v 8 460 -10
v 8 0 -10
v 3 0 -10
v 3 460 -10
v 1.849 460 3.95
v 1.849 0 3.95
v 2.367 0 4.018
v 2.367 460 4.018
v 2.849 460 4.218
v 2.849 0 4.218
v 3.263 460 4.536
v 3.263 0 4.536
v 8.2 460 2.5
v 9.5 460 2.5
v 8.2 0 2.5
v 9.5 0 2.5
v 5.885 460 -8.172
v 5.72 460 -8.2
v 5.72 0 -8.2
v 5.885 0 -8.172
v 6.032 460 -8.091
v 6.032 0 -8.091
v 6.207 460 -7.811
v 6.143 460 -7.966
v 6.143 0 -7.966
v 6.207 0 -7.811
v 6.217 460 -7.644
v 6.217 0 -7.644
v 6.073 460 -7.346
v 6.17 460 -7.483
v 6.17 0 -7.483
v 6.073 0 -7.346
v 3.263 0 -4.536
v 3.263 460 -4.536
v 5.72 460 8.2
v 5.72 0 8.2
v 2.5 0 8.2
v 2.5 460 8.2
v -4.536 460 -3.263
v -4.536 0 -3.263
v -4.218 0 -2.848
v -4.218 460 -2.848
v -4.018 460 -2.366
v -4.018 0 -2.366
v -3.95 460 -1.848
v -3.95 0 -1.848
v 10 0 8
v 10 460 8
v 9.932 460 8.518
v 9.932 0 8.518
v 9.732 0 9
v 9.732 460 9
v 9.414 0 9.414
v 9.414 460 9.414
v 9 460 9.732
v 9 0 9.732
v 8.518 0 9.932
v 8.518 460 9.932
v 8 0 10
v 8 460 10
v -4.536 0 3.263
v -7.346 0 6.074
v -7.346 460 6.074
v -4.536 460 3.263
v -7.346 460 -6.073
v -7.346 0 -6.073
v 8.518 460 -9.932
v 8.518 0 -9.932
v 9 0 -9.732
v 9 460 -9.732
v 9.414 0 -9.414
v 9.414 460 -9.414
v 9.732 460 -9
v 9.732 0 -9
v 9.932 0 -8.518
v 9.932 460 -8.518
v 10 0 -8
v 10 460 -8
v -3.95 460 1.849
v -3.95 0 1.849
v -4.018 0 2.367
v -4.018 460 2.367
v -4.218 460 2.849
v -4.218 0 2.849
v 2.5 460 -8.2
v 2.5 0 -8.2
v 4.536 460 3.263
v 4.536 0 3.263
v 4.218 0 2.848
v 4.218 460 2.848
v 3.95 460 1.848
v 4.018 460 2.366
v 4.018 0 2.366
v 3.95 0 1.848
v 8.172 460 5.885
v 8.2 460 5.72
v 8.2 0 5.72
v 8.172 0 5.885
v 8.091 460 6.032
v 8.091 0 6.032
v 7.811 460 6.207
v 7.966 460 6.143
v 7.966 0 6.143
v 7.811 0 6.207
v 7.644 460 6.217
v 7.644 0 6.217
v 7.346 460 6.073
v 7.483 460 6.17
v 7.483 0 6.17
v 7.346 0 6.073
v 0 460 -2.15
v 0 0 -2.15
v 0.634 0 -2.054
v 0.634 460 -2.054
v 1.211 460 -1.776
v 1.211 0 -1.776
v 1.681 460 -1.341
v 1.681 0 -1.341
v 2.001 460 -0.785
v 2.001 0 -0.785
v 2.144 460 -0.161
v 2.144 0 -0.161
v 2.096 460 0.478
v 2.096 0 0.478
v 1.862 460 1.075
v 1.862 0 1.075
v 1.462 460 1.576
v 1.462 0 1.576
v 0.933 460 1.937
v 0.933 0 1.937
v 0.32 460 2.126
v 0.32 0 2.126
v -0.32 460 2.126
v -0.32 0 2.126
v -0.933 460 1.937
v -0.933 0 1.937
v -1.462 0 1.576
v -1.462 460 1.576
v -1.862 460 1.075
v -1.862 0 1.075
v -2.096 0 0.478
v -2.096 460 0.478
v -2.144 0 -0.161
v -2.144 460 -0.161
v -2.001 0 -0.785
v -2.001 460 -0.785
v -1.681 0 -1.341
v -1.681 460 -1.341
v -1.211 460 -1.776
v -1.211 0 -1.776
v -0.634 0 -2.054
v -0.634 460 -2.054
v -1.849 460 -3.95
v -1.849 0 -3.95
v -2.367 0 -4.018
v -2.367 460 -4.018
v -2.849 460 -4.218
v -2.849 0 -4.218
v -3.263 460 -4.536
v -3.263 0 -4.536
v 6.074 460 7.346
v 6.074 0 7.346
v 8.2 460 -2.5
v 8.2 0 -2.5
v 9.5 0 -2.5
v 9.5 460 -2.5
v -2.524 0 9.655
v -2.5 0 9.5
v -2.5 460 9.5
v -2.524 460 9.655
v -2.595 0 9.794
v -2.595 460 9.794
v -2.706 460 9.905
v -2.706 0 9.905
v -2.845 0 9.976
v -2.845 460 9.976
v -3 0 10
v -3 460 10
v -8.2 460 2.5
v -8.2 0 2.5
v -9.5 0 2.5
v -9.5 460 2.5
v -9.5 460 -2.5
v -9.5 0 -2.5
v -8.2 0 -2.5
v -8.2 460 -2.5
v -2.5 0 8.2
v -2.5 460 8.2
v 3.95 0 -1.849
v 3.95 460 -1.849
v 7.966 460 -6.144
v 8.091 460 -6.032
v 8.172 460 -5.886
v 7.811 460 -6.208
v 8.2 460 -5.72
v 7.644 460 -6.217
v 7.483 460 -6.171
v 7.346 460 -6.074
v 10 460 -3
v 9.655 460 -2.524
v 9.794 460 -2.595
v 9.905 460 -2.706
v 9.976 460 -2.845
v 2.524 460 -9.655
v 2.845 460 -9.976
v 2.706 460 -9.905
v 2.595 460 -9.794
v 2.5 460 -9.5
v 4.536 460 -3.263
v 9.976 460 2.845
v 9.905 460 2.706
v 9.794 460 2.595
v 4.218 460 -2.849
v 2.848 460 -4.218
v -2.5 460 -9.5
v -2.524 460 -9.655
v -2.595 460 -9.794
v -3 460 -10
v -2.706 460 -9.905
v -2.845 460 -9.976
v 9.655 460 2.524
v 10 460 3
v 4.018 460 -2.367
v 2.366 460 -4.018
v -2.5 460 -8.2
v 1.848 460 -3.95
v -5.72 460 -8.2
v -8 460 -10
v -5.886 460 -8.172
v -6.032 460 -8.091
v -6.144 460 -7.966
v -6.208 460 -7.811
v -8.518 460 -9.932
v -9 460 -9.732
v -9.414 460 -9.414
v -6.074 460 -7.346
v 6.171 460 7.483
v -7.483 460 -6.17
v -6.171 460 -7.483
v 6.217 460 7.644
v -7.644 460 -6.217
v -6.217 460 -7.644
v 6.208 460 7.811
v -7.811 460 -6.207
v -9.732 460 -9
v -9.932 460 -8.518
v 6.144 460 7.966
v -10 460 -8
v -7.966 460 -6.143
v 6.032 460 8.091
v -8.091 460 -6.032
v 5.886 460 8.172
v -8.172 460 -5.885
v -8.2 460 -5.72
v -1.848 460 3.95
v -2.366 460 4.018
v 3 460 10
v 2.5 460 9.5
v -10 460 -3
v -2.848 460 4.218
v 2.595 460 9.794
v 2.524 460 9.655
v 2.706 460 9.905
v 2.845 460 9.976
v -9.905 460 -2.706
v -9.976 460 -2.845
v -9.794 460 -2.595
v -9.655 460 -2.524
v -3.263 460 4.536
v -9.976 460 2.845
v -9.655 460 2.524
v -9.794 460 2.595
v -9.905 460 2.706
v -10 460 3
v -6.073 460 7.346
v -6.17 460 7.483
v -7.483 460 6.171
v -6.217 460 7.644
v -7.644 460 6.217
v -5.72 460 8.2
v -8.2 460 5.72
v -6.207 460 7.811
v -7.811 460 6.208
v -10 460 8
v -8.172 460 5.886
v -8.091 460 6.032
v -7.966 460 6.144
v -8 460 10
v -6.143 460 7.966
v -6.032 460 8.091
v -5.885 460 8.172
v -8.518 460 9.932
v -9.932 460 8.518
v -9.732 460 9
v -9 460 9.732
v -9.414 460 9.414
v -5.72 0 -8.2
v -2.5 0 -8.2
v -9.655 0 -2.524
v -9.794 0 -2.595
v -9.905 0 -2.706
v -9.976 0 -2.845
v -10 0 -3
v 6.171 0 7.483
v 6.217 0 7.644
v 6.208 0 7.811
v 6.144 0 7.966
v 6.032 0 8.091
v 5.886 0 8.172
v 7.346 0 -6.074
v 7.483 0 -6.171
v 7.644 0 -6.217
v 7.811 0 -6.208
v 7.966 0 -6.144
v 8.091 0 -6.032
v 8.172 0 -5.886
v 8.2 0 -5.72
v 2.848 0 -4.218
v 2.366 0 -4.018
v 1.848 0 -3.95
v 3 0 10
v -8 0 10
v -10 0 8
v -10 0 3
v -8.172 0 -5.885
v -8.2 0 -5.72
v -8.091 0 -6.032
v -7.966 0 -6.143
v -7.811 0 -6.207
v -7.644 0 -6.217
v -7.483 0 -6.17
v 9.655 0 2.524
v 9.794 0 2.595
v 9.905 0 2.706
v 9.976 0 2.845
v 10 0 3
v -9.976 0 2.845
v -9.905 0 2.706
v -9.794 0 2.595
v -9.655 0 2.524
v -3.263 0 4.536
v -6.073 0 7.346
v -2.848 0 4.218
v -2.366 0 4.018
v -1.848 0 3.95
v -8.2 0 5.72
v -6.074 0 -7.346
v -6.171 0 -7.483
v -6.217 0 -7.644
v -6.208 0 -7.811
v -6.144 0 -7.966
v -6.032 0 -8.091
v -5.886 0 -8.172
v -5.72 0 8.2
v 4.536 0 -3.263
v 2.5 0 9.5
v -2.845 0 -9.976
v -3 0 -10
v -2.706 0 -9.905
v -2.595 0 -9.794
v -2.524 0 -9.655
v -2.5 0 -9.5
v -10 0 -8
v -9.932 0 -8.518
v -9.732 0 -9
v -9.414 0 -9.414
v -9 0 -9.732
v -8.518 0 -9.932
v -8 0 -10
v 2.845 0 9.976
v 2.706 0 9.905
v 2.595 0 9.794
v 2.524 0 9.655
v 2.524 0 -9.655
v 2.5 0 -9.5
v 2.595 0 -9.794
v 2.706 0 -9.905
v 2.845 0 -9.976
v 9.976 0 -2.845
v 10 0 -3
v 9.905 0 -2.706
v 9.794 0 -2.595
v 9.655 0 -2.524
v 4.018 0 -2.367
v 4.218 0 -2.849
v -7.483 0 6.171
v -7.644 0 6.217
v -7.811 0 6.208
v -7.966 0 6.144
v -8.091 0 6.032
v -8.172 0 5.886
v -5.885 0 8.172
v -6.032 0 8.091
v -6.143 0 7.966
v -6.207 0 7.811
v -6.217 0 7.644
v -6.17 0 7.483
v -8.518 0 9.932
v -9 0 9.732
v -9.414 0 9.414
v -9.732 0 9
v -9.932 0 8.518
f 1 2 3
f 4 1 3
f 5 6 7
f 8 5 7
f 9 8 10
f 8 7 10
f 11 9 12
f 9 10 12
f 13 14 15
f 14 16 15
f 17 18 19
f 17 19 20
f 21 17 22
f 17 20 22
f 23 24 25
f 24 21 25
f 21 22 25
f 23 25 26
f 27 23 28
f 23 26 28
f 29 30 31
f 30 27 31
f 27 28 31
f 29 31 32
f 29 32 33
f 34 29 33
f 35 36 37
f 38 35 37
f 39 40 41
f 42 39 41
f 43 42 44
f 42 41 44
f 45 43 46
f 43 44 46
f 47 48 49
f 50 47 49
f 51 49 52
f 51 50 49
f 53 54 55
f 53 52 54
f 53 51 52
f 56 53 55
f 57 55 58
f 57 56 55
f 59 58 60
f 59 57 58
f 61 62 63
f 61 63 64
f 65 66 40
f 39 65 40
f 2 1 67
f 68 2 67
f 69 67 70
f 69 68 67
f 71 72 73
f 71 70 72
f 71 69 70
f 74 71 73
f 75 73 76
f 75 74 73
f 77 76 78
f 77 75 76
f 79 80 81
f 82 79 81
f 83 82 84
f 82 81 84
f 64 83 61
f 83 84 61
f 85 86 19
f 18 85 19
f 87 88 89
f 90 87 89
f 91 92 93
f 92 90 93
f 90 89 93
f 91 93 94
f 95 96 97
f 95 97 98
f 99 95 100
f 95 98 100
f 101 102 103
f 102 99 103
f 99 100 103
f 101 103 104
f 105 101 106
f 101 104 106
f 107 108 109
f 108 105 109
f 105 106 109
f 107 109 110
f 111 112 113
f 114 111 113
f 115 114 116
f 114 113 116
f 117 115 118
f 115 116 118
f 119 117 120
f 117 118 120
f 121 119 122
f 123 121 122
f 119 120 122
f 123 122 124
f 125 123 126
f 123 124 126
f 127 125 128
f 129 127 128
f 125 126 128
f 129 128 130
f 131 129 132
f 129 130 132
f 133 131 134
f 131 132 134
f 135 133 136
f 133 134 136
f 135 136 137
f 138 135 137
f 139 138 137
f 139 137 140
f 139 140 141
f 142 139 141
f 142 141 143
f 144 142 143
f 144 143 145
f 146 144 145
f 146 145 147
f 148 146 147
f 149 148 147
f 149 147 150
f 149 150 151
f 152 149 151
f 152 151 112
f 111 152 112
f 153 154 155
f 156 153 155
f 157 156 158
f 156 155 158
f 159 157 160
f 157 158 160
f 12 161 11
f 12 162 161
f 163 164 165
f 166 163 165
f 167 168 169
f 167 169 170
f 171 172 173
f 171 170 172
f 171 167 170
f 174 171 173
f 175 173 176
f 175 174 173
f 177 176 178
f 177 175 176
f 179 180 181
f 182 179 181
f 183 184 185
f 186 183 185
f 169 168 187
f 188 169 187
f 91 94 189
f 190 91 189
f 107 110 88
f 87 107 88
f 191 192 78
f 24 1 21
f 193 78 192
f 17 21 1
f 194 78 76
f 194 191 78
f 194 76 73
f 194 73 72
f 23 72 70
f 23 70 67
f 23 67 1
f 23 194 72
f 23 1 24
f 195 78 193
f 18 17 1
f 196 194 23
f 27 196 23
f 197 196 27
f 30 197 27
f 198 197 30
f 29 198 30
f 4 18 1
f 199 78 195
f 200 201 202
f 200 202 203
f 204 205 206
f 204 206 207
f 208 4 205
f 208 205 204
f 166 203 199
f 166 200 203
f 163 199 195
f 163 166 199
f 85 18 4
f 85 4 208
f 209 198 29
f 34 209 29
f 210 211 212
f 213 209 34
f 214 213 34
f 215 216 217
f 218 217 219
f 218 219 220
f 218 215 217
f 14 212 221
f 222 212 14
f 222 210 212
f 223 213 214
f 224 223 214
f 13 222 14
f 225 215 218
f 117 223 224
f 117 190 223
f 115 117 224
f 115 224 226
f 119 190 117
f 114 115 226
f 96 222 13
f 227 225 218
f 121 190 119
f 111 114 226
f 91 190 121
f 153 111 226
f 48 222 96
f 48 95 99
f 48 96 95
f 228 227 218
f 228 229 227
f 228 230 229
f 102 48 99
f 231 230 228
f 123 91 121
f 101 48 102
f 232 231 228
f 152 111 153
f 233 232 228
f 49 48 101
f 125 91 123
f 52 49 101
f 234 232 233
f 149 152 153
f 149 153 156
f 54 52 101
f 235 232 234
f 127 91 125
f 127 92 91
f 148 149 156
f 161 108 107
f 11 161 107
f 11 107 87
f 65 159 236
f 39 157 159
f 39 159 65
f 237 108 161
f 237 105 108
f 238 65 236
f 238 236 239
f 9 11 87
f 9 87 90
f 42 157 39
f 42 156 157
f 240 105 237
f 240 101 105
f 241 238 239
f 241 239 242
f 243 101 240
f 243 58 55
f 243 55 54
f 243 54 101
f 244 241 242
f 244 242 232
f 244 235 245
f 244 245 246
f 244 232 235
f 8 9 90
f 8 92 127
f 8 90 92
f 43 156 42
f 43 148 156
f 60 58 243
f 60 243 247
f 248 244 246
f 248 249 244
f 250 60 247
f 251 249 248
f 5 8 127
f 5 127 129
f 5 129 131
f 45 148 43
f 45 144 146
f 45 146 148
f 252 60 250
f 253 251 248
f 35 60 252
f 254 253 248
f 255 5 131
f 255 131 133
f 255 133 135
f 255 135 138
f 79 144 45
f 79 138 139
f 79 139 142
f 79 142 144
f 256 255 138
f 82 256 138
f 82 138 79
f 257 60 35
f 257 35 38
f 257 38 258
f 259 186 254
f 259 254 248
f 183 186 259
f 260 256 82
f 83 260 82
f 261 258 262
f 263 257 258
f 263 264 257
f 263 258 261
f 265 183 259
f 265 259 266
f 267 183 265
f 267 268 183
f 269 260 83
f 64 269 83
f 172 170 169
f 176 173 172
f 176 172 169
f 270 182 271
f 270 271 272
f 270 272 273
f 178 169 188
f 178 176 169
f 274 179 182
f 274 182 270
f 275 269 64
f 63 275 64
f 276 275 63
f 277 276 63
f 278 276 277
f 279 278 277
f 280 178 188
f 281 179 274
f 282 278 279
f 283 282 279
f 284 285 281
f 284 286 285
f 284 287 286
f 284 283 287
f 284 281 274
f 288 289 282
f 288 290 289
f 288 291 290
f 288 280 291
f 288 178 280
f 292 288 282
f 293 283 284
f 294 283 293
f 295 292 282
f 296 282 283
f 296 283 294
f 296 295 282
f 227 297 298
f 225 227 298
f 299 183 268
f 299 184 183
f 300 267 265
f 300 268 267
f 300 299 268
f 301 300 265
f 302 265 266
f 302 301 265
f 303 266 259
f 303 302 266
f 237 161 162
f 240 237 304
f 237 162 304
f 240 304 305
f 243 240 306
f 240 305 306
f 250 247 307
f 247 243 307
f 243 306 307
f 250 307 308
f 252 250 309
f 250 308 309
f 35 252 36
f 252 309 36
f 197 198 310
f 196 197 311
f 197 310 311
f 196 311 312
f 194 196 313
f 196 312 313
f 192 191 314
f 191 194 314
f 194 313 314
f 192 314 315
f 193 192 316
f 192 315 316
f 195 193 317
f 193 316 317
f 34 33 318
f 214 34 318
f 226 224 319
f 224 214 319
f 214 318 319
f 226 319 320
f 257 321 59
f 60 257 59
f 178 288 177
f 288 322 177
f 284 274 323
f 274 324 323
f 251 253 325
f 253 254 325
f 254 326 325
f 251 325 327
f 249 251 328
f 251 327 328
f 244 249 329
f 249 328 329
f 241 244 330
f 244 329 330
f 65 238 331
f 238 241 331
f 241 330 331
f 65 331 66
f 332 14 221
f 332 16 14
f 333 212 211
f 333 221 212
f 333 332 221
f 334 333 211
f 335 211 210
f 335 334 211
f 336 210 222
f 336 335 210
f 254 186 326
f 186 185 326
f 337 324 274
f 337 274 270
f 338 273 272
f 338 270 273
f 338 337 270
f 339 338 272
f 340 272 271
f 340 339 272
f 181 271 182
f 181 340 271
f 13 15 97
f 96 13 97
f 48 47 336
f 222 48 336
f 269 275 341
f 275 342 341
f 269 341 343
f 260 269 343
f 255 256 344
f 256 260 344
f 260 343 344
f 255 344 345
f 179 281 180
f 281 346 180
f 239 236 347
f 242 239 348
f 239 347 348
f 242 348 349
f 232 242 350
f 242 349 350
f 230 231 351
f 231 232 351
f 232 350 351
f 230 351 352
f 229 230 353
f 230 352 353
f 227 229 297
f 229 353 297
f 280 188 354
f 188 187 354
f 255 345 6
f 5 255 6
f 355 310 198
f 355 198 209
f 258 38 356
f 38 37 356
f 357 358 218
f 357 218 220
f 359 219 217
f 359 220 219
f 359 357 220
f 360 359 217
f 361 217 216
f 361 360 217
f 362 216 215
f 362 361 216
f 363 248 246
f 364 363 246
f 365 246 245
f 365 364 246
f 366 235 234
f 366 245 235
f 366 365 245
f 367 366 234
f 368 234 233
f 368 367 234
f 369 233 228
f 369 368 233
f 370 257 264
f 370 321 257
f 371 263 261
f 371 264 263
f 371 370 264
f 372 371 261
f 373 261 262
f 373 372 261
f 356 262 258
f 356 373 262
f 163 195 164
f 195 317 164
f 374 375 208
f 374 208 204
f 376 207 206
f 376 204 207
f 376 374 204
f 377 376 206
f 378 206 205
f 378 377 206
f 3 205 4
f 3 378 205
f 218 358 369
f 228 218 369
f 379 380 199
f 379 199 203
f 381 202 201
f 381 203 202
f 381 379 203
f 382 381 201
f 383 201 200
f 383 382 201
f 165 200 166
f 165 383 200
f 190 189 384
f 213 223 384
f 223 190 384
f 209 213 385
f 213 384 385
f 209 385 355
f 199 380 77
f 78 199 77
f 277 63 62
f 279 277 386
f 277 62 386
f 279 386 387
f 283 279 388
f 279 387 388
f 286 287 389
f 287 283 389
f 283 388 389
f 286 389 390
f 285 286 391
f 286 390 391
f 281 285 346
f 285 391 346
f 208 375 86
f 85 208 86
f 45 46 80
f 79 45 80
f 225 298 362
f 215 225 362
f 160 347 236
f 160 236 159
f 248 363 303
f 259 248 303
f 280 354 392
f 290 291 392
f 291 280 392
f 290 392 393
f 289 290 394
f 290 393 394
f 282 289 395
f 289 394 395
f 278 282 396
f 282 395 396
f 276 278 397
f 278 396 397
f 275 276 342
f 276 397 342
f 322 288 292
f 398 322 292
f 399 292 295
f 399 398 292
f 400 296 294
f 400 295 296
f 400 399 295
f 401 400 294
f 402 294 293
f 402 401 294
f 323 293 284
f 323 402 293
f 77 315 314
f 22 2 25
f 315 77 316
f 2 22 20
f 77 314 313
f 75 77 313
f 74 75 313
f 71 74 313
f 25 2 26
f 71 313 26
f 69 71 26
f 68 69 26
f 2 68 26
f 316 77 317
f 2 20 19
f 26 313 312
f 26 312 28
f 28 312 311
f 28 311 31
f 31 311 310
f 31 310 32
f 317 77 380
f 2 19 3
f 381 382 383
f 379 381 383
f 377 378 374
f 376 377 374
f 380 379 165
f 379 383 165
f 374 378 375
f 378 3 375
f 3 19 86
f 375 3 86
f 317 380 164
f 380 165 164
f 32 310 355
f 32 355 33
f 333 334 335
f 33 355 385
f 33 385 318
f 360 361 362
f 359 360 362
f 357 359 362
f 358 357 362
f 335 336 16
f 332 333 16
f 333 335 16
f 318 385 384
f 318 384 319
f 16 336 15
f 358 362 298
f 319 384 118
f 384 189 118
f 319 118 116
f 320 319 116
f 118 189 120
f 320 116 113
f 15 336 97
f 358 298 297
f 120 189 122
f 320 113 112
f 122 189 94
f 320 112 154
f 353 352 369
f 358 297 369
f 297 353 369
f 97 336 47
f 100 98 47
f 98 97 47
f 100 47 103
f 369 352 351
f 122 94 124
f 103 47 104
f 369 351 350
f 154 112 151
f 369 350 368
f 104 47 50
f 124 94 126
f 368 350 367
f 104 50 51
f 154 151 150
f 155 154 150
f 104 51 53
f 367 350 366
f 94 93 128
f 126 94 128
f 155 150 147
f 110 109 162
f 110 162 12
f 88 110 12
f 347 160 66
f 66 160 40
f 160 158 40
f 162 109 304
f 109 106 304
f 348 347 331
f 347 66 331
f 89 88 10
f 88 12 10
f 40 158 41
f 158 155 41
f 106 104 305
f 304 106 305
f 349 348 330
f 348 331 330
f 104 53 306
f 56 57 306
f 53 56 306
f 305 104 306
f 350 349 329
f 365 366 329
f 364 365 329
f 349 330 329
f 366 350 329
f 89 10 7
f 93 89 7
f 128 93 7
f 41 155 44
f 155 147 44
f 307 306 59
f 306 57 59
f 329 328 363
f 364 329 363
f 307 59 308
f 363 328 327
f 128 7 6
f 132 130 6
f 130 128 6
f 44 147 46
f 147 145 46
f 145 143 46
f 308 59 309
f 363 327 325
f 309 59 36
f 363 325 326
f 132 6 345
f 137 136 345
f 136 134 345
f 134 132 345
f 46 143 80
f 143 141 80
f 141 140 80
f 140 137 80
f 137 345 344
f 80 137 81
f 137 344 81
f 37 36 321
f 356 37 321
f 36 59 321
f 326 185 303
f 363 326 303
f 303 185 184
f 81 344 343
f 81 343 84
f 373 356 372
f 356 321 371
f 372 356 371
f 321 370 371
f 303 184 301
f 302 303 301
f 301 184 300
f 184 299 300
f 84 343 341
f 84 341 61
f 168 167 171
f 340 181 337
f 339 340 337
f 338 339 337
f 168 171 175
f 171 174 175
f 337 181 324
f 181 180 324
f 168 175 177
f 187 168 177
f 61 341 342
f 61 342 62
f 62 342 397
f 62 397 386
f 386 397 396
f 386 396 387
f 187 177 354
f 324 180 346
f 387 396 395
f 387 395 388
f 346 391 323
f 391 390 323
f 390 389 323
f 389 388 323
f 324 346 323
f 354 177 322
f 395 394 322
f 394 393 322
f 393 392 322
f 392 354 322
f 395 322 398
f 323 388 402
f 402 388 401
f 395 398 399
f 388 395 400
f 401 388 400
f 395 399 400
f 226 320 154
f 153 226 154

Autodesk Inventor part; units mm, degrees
ref_plane "YZ Plane" through (0, 0, 0) normal (1, 0, 0) x (0, 1, 0)
ref_plane "XZ Plane" through (0, 0, 0) normal (0, 1, 0) x (-1, 0, 0)
ref_plane "XY Plane" through (0, 0, 0) normal (0, 0, 1) x (1, 0, 0)
sketch "Sketch1" plane through (0, 0, 0) normal (0, 1, 0) x (-1, 0, 0)
  line L0 (8, 10) -> (3, 10)
  line L1 (10, 3) -> (10, 8)
  line L2 (2.5, 9.5) -> (2.5, 8.2)
  line L3 (2.5, 8.2) -> (5.7198, 8.2)
  line L4 (6.0734, 7.3464) -> (3.2627, 4.5358)
  line L5 (1.8485, 3.95) -> (0, 3.95)
  line L6 (0, 3.95) -> (0, 2.15)
  line L7 (0, 2.15) -> (0, 2.15)
  line L8 (2.15, 0) -> (2.15, 0)
  line L9 (2.15, 0) -> (3.95, 0)
  line L10 (8.2, 5.7204) -> (8.2, 2.5)
  line L11 (8.2, 2.5) -> (9.5, 2.5)
  line L12 (0, 29.0836) -> (0, -4.1523) construction
  line L13 (3.95, 0) -> (3.95, 1.8491)
  line L14 (7.3464, 6.0739) -> (4.5358, 3.2633)
  arc A0 (10, 8) -> (8, 10) centre (8, 8) ccw
  arc A1 (8.2, 5.7204) -> (7.3464, 6.0739) centre (7.7, 5.7204) ccw
  arc A2 (6.0734, 7.3464) -> (5.7198, 8.2) centre (5.7198, 7.7) ccw
  arc A3 (4.5358, 3.2633) -> (3.95, 1.8491) centre (5.95, 1.8491) ccw
  arc A4 (1.8485, 3.95) -> (3.2627, 4.5358) centre (1.8485, 5.95) ccw
  arc A5 (2.15, 0) -> (0, 2.15) centre (0, 0) ccw
  arc A6 (3, 10) -> (2.5, 9.5) centre (3, 9.5) ccw
  arc A7 (9.5, 2.5) -> (10, 3) centre (9.5, 3) ccw
  line L15 (18.5462, 0) -> (-9.9601, 0) construction
  line L16 (-3, 10) -> (-8, 10)
  arc A8 (-2.5, 9.5) -> (-3, 10) centre (-3, 9.5) ccw
  line L17 (-2.5, 8.2) -> (-2.5, 9.5)
  line L18 (-5.7204, 8.2) -> (-2.5, 8.2)
  arc A9 (-5.7204, 8.2) -> (-6.0739, 7.3464) centre (-5.7204, 7.7) ccw
  line L19 (-6.0739, 7.3464) -> (-3.2633, 4.5358)
  arc A10 (-3.2633, 4.5358) -> (-1.8491, 3.95) centre (-1.8491, 5.95) ccw
  line L20 (0, 3.95) -> (-1.8491, 3.95)
  line L21 (0, 2.15) -> (0, 3.95)
  arc A11 (0, 2.15) -> (-2.15, 0) centre (0, 0) ccw
  line L22 (-3.95, 0) -> (-2.15, 0)
  line L23 (-3.95, 1.8485) -> (-3.95, 0)
  arc A12 (-3.95, 1.8485) -> (-4.5358, 3.2627) centre (-5.95, 1.8485) ccw
  line L24 (-7.3464, 6.0734) -> (-4.5358, 3.2627)
  arc A13 (-7.3464, 6.0734) -> (-8.2, 5.7198) centre (-7.7, 5.7198) ccw
  line L25 (-8.2, 2.5) -> (-8.2, 5.7198)
  line L26 (-9.5, 2.5) -> (-8.2, 2.5)
  arc A14 (-10, 3) -> (-9.5, 2.5) centre (-9.5, 3) ccw
  line L27 (-10, 8) -> (-10, 3)
  arc A15 (-8, 10) -> (-10, 8) centre (-8, 8) ccw
  line L28 (-10, -3) -> (-10, -8)
  arc A16 (-9.5, -2.5) -> (-10, -3) centre (-9.5, -3) ccw
  line L29 (-8.2, -2.5) -> (-9.5, -2.5)
  line L30 (-8.2, -5.7204) -> (-8.2, -2.5)
  arc A17 (-8.2, -5.7204) -> (-7.3464, -6.0739) centre (-7.7, -5.7204) ccw
  line L31 (-7.3464, -6.0739) -> (-4.5358, -3.2633)
  arc A18 (-4.5358, -3.2633) -> (-3.95, -1.8491) centre (-5.95, -1.8491) ccw
  line L32 (-3.95, 0) -> (-3.95, -1.8491)
  line L33 (-2.15, 0) -> (-3.95, 0)
  arc A19 (-2.15, 0) -> (0, -2.15) centre (0, 0) ccw
  line L34 (0, -3.95) -> (0, -2.15)
  line L35 (-1.8485, -3.95) -> (0, -3.95)
  arc A20 (-1.8485, -3.95) -> (-3.2627, -4.5358) centre (-1.8485, -5.95) ccw
  line L36 (-6.0734, -7.3464) -> (-3.2627, -4.5358)
  arc A21 (-6.0734, -7.3464) -> (-5.7198, -8.2) centre (-5.7198, -7.7) ccw
  line L37 (-2.5, -8.2) -> (-5.7198, -8.2)
  line L38 (-2.5, -9.5) -> (-2.5, -8.2)
  arc A22 (-3, -10) -> (-2.5, -9.5) centre (-3, -9.5) ccw
  line L39 (-8, -10) -> (-3, -10)
  arc A23 (-10, -8) -> (-8, -10) centre (-8, -8) ccw
  line L40 (3, -10) -> (8, -10)
  arc A24 (2.5, -9.5) -> (3, -10) centre (3, -9.5) ccw
  line L41 (2.5, -8.2) -> (2.5, -9.5)
  line L42 (5.7204, -8.2) -> (2.5, -8.2)
  arc A25 (5.7204, -8.2) -> (6.0739, -7.3464) centre (5.7204, -7.7) ccw
  line L43 (6.0739, -7.3464) -> (3.2633, -4.5358)
  arc A26 (3.2633, -4.5358) -> (1.8491, -3.95) centre (1.8491, -5.95) ccw
  line L44 (0, -3.95) -> (1.8491, -3.95)
  line L45 (0, -2.15) -> (0, -3.95)
  arc A27 (0, -2.15) -> (2.15, 0) centre (0, 0) ccw
  line L46 (3.95, 0) -> (2.15, 0)
  line L47 (3.95, -1.8485) -> (3.95, 0)
  arc A28 (3.95, -1.8485) -> (4.5358, -3.2627) centre (5.95, -1.8485) ccw
  line L48 (7.3464, -6.0734) -> (4.5358, -3.2627)
  arc A29 (7.3464, -6.0734) -> (8.2, -5.7198) centre (7.7, -5.7198) ccw
  line L49 (8.2, -2.5) -> (8.2, -5.7198)
  line L50 (9.5, -2.5) -> (8.2, -2.5)
  arc A30 (10, -3) -> (9.5, -2.5) centre (9.5, -3) ccw
  line L51 (10, -8) -> (10, -3)
  arc A31 (8, -10) -> (10, -8) centre (8, -8) ccw
  point P0 (0, 0)
  point P1 (3.95, 2.6775)
  point P2 (-2.6775, 3.95)
  point P3 (0, 0)
  point P4 (-3.95, -2.6775)
  point P5 (0, 0)
  point P6 (2.6775, -3.95)
  point P7 (0, 0)
  dimension "d1" = 2.5
  dimension "d2" = 2.5
  dimension "d3" = 1.8
  dimension "d4" = 1.8
  dimension "d5" = 45
  dimension "d6" = 2.15
  dimension "d7" = 2.15
  dimension "d8" = 1.8
  dimension "d11" = 10
  dimension "d12" = 10
  dimension "d14" = 1.8
  dimension "d15" = 1.8
  dimension "d16" = 2.6775
  dimension "d18" = 2
  dimension "d19" = 0.5
  dimension "d20" = 2
  dimension "d21" = 2.15
  dimension "d22" = 0.5
  dimension "d25" = 360
extrude "Profil_20x20" add sketch "Sketch1" along normal blind 460 contours A0 L1 A7 L11 L10 A1 L14 A3 L13 L9 A5 L6 L5 A4 L4 A2 L3 L2 A6 L0 | L6 A11 L22 L23 A12 L24 A13 L25 L26 A14 L27 A15 L16 A8 L17 L18 A9 L19 A10 L20 | L47 A28 L48 A29 L49 L50 A30 L51 A31 L40 A24 L41 L42 A25 L43 A26 L44 L34 A27 L9 | A19 L34 L35 A20 L36 A21 L37 L38 A22 L39 A23 L28 A16 L29 L30 A17 L31 A18 L32 L22
properties part number "Profil_20x20_330"
